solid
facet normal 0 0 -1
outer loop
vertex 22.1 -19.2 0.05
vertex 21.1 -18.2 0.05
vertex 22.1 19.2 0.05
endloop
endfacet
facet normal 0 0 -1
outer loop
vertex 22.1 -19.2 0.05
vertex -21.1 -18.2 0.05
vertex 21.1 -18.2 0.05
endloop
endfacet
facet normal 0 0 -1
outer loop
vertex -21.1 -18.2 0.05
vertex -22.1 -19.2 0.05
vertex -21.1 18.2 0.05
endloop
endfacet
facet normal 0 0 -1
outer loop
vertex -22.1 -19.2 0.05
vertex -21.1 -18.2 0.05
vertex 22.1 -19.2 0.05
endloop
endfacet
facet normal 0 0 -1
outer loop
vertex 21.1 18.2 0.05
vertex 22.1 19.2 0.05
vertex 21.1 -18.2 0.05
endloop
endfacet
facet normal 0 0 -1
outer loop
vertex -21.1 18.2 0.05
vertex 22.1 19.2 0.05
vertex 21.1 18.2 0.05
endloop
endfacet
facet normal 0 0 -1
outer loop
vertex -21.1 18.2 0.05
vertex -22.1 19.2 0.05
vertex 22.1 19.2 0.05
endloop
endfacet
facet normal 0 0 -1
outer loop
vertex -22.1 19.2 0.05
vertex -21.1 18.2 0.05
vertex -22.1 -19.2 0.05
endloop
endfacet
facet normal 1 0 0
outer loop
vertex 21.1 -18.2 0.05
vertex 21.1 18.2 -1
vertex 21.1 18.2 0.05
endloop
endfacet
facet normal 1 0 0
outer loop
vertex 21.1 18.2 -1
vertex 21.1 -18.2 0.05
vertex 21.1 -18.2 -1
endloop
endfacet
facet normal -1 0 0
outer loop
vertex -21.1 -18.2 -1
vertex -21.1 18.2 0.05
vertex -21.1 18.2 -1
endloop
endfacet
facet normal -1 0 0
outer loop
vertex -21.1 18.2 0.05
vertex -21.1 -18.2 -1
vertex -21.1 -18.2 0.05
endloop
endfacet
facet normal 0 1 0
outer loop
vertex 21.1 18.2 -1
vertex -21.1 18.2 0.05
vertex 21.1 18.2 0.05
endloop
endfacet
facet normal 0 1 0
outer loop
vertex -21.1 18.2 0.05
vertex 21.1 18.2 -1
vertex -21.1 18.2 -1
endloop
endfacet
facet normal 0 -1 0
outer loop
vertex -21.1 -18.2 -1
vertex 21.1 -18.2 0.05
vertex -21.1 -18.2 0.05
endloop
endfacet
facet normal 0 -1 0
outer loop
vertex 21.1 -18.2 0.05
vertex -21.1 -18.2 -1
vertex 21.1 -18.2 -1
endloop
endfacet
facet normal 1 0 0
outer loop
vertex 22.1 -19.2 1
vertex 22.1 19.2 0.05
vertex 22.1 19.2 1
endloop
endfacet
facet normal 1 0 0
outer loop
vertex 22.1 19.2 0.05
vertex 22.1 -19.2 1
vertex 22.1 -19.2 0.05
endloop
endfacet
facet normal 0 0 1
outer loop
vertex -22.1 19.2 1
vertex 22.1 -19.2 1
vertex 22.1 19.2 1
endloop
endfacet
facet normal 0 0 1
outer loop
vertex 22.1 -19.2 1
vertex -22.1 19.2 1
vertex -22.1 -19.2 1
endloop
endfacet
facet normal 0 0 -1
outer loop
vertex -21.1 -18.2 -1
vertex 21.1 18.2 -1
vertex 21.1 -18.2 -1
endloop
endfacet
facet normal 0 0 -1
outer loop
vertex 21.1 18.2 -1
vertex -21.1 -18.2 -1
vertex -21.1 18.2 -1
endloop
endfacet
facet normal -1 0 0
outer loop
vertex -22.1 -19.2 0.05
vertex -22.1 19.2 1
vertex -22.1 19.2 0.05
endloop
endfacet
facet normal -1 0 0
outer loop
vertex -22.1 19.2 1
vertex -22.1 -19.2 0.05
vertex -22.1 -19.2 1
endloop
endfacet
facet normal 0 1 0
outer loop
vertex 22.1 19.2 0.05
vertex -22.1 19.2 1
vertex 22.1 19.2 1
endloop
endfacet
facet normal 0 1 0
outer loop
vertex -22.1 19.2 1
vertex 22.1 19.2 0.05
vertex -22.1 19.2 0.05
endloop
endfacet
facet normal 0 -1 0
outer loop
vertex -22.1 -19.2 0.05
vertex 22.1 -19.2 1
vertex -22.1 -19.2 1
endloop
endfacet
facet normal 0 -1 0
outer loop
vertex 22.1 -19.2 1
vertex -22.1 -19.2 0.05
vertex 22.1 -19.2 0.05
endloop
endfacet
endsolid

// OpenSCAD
// file: BOSL2/std.scad
// Minimal BOSL2 compatibility shim for bundled gallery models.
// It implements only the helpers used by the imported OpenSCAD projects.

CENTER = [0, 0, 0];
BOTTOM = [0, 0, -1];
TOP = [0, 0, 1];
LEFT = [-1, 0, 0];
RIGHT = [1, 0, 0];
FRONT = [0, -1, 0];
BACK = [0, 1, 0];

module up(z=0) {
    translate([0, 0, z]) children();
}

module down(z=0) {
    translate([0, 0, -z]) children();
}

module attach(anchor=CENTER) {
    children();
}

module cuboid(size=[1, 1, 1], anchor=CENTER) {
    center = anchor == CENTER;
    translate(center ? [0, 0, 0] : [0, 0, size[2] / 2])
        cube(size, center=true);
    children();
}

module xcyl(h=1, r=1, anchor=CENTER) {
    center = anchor == CENTER;
    translate(center ? [0, 0, 0] : [h / 2, 0, 0])
        rotate([0, 90, 0])
            cylinder(h=h, r=r, center=true);
}
// main file
include <BOSL2/std.scad>

$fn = 100;

// Plexiglass display window (flush mount)
// Same step principle as LED ring — lip sits in case recess, step drops into cutout

// Case cutout (through-hole in case) — asymmetric width (+5mm top, +3mm bottom)
case_cutout_w = 42.5;       // mm — enlarged for OLED clearance
case_cutout_h = 36.7;       // mm

// Case recess (1mm deep pocket)
case_recess_w = 44.5;       // mm
case_recess_h = 38.7;       // mm

// Plexiglass window dimensions — lip sits in recess
clearance = 0.15;         // mm — per side, for press-fit
plexi_top_w = case_recess_w - 2*clearance;    // fits in recess with clearance
plexi_top_h = case_recess_h - 2*clearance;
plexi_step_w = case_cutout_w - 2*clearance;   // fits in cutout with clearance
plexi_step_h = case_cutout_h - 2*clearance;
plexi_thickness = 2.0;      // mm total
step_depth = 1.0;           // mm — bottom step
corner_r = 2.0;             // mm — rounded corners (matches 4mm mill radius)

color([0.3, 0.3, 0.3, 0.7])
difference() {
    cuboid([plexi_top_w, plexi_top_h, plexi_thickness], rounding=corner_r, edges="Z");
    // Remove outer material from bottom half to create step
    down(step_depth/2) difference() {
        cuboid([plexi_top_w+1, plexi_top_h+1, step_depth+0.1]);
        cuboid([plexi_step_w, plexi_step_h, step_depth+0.2], rounding=corner_r, edges="Z");
    }
}
